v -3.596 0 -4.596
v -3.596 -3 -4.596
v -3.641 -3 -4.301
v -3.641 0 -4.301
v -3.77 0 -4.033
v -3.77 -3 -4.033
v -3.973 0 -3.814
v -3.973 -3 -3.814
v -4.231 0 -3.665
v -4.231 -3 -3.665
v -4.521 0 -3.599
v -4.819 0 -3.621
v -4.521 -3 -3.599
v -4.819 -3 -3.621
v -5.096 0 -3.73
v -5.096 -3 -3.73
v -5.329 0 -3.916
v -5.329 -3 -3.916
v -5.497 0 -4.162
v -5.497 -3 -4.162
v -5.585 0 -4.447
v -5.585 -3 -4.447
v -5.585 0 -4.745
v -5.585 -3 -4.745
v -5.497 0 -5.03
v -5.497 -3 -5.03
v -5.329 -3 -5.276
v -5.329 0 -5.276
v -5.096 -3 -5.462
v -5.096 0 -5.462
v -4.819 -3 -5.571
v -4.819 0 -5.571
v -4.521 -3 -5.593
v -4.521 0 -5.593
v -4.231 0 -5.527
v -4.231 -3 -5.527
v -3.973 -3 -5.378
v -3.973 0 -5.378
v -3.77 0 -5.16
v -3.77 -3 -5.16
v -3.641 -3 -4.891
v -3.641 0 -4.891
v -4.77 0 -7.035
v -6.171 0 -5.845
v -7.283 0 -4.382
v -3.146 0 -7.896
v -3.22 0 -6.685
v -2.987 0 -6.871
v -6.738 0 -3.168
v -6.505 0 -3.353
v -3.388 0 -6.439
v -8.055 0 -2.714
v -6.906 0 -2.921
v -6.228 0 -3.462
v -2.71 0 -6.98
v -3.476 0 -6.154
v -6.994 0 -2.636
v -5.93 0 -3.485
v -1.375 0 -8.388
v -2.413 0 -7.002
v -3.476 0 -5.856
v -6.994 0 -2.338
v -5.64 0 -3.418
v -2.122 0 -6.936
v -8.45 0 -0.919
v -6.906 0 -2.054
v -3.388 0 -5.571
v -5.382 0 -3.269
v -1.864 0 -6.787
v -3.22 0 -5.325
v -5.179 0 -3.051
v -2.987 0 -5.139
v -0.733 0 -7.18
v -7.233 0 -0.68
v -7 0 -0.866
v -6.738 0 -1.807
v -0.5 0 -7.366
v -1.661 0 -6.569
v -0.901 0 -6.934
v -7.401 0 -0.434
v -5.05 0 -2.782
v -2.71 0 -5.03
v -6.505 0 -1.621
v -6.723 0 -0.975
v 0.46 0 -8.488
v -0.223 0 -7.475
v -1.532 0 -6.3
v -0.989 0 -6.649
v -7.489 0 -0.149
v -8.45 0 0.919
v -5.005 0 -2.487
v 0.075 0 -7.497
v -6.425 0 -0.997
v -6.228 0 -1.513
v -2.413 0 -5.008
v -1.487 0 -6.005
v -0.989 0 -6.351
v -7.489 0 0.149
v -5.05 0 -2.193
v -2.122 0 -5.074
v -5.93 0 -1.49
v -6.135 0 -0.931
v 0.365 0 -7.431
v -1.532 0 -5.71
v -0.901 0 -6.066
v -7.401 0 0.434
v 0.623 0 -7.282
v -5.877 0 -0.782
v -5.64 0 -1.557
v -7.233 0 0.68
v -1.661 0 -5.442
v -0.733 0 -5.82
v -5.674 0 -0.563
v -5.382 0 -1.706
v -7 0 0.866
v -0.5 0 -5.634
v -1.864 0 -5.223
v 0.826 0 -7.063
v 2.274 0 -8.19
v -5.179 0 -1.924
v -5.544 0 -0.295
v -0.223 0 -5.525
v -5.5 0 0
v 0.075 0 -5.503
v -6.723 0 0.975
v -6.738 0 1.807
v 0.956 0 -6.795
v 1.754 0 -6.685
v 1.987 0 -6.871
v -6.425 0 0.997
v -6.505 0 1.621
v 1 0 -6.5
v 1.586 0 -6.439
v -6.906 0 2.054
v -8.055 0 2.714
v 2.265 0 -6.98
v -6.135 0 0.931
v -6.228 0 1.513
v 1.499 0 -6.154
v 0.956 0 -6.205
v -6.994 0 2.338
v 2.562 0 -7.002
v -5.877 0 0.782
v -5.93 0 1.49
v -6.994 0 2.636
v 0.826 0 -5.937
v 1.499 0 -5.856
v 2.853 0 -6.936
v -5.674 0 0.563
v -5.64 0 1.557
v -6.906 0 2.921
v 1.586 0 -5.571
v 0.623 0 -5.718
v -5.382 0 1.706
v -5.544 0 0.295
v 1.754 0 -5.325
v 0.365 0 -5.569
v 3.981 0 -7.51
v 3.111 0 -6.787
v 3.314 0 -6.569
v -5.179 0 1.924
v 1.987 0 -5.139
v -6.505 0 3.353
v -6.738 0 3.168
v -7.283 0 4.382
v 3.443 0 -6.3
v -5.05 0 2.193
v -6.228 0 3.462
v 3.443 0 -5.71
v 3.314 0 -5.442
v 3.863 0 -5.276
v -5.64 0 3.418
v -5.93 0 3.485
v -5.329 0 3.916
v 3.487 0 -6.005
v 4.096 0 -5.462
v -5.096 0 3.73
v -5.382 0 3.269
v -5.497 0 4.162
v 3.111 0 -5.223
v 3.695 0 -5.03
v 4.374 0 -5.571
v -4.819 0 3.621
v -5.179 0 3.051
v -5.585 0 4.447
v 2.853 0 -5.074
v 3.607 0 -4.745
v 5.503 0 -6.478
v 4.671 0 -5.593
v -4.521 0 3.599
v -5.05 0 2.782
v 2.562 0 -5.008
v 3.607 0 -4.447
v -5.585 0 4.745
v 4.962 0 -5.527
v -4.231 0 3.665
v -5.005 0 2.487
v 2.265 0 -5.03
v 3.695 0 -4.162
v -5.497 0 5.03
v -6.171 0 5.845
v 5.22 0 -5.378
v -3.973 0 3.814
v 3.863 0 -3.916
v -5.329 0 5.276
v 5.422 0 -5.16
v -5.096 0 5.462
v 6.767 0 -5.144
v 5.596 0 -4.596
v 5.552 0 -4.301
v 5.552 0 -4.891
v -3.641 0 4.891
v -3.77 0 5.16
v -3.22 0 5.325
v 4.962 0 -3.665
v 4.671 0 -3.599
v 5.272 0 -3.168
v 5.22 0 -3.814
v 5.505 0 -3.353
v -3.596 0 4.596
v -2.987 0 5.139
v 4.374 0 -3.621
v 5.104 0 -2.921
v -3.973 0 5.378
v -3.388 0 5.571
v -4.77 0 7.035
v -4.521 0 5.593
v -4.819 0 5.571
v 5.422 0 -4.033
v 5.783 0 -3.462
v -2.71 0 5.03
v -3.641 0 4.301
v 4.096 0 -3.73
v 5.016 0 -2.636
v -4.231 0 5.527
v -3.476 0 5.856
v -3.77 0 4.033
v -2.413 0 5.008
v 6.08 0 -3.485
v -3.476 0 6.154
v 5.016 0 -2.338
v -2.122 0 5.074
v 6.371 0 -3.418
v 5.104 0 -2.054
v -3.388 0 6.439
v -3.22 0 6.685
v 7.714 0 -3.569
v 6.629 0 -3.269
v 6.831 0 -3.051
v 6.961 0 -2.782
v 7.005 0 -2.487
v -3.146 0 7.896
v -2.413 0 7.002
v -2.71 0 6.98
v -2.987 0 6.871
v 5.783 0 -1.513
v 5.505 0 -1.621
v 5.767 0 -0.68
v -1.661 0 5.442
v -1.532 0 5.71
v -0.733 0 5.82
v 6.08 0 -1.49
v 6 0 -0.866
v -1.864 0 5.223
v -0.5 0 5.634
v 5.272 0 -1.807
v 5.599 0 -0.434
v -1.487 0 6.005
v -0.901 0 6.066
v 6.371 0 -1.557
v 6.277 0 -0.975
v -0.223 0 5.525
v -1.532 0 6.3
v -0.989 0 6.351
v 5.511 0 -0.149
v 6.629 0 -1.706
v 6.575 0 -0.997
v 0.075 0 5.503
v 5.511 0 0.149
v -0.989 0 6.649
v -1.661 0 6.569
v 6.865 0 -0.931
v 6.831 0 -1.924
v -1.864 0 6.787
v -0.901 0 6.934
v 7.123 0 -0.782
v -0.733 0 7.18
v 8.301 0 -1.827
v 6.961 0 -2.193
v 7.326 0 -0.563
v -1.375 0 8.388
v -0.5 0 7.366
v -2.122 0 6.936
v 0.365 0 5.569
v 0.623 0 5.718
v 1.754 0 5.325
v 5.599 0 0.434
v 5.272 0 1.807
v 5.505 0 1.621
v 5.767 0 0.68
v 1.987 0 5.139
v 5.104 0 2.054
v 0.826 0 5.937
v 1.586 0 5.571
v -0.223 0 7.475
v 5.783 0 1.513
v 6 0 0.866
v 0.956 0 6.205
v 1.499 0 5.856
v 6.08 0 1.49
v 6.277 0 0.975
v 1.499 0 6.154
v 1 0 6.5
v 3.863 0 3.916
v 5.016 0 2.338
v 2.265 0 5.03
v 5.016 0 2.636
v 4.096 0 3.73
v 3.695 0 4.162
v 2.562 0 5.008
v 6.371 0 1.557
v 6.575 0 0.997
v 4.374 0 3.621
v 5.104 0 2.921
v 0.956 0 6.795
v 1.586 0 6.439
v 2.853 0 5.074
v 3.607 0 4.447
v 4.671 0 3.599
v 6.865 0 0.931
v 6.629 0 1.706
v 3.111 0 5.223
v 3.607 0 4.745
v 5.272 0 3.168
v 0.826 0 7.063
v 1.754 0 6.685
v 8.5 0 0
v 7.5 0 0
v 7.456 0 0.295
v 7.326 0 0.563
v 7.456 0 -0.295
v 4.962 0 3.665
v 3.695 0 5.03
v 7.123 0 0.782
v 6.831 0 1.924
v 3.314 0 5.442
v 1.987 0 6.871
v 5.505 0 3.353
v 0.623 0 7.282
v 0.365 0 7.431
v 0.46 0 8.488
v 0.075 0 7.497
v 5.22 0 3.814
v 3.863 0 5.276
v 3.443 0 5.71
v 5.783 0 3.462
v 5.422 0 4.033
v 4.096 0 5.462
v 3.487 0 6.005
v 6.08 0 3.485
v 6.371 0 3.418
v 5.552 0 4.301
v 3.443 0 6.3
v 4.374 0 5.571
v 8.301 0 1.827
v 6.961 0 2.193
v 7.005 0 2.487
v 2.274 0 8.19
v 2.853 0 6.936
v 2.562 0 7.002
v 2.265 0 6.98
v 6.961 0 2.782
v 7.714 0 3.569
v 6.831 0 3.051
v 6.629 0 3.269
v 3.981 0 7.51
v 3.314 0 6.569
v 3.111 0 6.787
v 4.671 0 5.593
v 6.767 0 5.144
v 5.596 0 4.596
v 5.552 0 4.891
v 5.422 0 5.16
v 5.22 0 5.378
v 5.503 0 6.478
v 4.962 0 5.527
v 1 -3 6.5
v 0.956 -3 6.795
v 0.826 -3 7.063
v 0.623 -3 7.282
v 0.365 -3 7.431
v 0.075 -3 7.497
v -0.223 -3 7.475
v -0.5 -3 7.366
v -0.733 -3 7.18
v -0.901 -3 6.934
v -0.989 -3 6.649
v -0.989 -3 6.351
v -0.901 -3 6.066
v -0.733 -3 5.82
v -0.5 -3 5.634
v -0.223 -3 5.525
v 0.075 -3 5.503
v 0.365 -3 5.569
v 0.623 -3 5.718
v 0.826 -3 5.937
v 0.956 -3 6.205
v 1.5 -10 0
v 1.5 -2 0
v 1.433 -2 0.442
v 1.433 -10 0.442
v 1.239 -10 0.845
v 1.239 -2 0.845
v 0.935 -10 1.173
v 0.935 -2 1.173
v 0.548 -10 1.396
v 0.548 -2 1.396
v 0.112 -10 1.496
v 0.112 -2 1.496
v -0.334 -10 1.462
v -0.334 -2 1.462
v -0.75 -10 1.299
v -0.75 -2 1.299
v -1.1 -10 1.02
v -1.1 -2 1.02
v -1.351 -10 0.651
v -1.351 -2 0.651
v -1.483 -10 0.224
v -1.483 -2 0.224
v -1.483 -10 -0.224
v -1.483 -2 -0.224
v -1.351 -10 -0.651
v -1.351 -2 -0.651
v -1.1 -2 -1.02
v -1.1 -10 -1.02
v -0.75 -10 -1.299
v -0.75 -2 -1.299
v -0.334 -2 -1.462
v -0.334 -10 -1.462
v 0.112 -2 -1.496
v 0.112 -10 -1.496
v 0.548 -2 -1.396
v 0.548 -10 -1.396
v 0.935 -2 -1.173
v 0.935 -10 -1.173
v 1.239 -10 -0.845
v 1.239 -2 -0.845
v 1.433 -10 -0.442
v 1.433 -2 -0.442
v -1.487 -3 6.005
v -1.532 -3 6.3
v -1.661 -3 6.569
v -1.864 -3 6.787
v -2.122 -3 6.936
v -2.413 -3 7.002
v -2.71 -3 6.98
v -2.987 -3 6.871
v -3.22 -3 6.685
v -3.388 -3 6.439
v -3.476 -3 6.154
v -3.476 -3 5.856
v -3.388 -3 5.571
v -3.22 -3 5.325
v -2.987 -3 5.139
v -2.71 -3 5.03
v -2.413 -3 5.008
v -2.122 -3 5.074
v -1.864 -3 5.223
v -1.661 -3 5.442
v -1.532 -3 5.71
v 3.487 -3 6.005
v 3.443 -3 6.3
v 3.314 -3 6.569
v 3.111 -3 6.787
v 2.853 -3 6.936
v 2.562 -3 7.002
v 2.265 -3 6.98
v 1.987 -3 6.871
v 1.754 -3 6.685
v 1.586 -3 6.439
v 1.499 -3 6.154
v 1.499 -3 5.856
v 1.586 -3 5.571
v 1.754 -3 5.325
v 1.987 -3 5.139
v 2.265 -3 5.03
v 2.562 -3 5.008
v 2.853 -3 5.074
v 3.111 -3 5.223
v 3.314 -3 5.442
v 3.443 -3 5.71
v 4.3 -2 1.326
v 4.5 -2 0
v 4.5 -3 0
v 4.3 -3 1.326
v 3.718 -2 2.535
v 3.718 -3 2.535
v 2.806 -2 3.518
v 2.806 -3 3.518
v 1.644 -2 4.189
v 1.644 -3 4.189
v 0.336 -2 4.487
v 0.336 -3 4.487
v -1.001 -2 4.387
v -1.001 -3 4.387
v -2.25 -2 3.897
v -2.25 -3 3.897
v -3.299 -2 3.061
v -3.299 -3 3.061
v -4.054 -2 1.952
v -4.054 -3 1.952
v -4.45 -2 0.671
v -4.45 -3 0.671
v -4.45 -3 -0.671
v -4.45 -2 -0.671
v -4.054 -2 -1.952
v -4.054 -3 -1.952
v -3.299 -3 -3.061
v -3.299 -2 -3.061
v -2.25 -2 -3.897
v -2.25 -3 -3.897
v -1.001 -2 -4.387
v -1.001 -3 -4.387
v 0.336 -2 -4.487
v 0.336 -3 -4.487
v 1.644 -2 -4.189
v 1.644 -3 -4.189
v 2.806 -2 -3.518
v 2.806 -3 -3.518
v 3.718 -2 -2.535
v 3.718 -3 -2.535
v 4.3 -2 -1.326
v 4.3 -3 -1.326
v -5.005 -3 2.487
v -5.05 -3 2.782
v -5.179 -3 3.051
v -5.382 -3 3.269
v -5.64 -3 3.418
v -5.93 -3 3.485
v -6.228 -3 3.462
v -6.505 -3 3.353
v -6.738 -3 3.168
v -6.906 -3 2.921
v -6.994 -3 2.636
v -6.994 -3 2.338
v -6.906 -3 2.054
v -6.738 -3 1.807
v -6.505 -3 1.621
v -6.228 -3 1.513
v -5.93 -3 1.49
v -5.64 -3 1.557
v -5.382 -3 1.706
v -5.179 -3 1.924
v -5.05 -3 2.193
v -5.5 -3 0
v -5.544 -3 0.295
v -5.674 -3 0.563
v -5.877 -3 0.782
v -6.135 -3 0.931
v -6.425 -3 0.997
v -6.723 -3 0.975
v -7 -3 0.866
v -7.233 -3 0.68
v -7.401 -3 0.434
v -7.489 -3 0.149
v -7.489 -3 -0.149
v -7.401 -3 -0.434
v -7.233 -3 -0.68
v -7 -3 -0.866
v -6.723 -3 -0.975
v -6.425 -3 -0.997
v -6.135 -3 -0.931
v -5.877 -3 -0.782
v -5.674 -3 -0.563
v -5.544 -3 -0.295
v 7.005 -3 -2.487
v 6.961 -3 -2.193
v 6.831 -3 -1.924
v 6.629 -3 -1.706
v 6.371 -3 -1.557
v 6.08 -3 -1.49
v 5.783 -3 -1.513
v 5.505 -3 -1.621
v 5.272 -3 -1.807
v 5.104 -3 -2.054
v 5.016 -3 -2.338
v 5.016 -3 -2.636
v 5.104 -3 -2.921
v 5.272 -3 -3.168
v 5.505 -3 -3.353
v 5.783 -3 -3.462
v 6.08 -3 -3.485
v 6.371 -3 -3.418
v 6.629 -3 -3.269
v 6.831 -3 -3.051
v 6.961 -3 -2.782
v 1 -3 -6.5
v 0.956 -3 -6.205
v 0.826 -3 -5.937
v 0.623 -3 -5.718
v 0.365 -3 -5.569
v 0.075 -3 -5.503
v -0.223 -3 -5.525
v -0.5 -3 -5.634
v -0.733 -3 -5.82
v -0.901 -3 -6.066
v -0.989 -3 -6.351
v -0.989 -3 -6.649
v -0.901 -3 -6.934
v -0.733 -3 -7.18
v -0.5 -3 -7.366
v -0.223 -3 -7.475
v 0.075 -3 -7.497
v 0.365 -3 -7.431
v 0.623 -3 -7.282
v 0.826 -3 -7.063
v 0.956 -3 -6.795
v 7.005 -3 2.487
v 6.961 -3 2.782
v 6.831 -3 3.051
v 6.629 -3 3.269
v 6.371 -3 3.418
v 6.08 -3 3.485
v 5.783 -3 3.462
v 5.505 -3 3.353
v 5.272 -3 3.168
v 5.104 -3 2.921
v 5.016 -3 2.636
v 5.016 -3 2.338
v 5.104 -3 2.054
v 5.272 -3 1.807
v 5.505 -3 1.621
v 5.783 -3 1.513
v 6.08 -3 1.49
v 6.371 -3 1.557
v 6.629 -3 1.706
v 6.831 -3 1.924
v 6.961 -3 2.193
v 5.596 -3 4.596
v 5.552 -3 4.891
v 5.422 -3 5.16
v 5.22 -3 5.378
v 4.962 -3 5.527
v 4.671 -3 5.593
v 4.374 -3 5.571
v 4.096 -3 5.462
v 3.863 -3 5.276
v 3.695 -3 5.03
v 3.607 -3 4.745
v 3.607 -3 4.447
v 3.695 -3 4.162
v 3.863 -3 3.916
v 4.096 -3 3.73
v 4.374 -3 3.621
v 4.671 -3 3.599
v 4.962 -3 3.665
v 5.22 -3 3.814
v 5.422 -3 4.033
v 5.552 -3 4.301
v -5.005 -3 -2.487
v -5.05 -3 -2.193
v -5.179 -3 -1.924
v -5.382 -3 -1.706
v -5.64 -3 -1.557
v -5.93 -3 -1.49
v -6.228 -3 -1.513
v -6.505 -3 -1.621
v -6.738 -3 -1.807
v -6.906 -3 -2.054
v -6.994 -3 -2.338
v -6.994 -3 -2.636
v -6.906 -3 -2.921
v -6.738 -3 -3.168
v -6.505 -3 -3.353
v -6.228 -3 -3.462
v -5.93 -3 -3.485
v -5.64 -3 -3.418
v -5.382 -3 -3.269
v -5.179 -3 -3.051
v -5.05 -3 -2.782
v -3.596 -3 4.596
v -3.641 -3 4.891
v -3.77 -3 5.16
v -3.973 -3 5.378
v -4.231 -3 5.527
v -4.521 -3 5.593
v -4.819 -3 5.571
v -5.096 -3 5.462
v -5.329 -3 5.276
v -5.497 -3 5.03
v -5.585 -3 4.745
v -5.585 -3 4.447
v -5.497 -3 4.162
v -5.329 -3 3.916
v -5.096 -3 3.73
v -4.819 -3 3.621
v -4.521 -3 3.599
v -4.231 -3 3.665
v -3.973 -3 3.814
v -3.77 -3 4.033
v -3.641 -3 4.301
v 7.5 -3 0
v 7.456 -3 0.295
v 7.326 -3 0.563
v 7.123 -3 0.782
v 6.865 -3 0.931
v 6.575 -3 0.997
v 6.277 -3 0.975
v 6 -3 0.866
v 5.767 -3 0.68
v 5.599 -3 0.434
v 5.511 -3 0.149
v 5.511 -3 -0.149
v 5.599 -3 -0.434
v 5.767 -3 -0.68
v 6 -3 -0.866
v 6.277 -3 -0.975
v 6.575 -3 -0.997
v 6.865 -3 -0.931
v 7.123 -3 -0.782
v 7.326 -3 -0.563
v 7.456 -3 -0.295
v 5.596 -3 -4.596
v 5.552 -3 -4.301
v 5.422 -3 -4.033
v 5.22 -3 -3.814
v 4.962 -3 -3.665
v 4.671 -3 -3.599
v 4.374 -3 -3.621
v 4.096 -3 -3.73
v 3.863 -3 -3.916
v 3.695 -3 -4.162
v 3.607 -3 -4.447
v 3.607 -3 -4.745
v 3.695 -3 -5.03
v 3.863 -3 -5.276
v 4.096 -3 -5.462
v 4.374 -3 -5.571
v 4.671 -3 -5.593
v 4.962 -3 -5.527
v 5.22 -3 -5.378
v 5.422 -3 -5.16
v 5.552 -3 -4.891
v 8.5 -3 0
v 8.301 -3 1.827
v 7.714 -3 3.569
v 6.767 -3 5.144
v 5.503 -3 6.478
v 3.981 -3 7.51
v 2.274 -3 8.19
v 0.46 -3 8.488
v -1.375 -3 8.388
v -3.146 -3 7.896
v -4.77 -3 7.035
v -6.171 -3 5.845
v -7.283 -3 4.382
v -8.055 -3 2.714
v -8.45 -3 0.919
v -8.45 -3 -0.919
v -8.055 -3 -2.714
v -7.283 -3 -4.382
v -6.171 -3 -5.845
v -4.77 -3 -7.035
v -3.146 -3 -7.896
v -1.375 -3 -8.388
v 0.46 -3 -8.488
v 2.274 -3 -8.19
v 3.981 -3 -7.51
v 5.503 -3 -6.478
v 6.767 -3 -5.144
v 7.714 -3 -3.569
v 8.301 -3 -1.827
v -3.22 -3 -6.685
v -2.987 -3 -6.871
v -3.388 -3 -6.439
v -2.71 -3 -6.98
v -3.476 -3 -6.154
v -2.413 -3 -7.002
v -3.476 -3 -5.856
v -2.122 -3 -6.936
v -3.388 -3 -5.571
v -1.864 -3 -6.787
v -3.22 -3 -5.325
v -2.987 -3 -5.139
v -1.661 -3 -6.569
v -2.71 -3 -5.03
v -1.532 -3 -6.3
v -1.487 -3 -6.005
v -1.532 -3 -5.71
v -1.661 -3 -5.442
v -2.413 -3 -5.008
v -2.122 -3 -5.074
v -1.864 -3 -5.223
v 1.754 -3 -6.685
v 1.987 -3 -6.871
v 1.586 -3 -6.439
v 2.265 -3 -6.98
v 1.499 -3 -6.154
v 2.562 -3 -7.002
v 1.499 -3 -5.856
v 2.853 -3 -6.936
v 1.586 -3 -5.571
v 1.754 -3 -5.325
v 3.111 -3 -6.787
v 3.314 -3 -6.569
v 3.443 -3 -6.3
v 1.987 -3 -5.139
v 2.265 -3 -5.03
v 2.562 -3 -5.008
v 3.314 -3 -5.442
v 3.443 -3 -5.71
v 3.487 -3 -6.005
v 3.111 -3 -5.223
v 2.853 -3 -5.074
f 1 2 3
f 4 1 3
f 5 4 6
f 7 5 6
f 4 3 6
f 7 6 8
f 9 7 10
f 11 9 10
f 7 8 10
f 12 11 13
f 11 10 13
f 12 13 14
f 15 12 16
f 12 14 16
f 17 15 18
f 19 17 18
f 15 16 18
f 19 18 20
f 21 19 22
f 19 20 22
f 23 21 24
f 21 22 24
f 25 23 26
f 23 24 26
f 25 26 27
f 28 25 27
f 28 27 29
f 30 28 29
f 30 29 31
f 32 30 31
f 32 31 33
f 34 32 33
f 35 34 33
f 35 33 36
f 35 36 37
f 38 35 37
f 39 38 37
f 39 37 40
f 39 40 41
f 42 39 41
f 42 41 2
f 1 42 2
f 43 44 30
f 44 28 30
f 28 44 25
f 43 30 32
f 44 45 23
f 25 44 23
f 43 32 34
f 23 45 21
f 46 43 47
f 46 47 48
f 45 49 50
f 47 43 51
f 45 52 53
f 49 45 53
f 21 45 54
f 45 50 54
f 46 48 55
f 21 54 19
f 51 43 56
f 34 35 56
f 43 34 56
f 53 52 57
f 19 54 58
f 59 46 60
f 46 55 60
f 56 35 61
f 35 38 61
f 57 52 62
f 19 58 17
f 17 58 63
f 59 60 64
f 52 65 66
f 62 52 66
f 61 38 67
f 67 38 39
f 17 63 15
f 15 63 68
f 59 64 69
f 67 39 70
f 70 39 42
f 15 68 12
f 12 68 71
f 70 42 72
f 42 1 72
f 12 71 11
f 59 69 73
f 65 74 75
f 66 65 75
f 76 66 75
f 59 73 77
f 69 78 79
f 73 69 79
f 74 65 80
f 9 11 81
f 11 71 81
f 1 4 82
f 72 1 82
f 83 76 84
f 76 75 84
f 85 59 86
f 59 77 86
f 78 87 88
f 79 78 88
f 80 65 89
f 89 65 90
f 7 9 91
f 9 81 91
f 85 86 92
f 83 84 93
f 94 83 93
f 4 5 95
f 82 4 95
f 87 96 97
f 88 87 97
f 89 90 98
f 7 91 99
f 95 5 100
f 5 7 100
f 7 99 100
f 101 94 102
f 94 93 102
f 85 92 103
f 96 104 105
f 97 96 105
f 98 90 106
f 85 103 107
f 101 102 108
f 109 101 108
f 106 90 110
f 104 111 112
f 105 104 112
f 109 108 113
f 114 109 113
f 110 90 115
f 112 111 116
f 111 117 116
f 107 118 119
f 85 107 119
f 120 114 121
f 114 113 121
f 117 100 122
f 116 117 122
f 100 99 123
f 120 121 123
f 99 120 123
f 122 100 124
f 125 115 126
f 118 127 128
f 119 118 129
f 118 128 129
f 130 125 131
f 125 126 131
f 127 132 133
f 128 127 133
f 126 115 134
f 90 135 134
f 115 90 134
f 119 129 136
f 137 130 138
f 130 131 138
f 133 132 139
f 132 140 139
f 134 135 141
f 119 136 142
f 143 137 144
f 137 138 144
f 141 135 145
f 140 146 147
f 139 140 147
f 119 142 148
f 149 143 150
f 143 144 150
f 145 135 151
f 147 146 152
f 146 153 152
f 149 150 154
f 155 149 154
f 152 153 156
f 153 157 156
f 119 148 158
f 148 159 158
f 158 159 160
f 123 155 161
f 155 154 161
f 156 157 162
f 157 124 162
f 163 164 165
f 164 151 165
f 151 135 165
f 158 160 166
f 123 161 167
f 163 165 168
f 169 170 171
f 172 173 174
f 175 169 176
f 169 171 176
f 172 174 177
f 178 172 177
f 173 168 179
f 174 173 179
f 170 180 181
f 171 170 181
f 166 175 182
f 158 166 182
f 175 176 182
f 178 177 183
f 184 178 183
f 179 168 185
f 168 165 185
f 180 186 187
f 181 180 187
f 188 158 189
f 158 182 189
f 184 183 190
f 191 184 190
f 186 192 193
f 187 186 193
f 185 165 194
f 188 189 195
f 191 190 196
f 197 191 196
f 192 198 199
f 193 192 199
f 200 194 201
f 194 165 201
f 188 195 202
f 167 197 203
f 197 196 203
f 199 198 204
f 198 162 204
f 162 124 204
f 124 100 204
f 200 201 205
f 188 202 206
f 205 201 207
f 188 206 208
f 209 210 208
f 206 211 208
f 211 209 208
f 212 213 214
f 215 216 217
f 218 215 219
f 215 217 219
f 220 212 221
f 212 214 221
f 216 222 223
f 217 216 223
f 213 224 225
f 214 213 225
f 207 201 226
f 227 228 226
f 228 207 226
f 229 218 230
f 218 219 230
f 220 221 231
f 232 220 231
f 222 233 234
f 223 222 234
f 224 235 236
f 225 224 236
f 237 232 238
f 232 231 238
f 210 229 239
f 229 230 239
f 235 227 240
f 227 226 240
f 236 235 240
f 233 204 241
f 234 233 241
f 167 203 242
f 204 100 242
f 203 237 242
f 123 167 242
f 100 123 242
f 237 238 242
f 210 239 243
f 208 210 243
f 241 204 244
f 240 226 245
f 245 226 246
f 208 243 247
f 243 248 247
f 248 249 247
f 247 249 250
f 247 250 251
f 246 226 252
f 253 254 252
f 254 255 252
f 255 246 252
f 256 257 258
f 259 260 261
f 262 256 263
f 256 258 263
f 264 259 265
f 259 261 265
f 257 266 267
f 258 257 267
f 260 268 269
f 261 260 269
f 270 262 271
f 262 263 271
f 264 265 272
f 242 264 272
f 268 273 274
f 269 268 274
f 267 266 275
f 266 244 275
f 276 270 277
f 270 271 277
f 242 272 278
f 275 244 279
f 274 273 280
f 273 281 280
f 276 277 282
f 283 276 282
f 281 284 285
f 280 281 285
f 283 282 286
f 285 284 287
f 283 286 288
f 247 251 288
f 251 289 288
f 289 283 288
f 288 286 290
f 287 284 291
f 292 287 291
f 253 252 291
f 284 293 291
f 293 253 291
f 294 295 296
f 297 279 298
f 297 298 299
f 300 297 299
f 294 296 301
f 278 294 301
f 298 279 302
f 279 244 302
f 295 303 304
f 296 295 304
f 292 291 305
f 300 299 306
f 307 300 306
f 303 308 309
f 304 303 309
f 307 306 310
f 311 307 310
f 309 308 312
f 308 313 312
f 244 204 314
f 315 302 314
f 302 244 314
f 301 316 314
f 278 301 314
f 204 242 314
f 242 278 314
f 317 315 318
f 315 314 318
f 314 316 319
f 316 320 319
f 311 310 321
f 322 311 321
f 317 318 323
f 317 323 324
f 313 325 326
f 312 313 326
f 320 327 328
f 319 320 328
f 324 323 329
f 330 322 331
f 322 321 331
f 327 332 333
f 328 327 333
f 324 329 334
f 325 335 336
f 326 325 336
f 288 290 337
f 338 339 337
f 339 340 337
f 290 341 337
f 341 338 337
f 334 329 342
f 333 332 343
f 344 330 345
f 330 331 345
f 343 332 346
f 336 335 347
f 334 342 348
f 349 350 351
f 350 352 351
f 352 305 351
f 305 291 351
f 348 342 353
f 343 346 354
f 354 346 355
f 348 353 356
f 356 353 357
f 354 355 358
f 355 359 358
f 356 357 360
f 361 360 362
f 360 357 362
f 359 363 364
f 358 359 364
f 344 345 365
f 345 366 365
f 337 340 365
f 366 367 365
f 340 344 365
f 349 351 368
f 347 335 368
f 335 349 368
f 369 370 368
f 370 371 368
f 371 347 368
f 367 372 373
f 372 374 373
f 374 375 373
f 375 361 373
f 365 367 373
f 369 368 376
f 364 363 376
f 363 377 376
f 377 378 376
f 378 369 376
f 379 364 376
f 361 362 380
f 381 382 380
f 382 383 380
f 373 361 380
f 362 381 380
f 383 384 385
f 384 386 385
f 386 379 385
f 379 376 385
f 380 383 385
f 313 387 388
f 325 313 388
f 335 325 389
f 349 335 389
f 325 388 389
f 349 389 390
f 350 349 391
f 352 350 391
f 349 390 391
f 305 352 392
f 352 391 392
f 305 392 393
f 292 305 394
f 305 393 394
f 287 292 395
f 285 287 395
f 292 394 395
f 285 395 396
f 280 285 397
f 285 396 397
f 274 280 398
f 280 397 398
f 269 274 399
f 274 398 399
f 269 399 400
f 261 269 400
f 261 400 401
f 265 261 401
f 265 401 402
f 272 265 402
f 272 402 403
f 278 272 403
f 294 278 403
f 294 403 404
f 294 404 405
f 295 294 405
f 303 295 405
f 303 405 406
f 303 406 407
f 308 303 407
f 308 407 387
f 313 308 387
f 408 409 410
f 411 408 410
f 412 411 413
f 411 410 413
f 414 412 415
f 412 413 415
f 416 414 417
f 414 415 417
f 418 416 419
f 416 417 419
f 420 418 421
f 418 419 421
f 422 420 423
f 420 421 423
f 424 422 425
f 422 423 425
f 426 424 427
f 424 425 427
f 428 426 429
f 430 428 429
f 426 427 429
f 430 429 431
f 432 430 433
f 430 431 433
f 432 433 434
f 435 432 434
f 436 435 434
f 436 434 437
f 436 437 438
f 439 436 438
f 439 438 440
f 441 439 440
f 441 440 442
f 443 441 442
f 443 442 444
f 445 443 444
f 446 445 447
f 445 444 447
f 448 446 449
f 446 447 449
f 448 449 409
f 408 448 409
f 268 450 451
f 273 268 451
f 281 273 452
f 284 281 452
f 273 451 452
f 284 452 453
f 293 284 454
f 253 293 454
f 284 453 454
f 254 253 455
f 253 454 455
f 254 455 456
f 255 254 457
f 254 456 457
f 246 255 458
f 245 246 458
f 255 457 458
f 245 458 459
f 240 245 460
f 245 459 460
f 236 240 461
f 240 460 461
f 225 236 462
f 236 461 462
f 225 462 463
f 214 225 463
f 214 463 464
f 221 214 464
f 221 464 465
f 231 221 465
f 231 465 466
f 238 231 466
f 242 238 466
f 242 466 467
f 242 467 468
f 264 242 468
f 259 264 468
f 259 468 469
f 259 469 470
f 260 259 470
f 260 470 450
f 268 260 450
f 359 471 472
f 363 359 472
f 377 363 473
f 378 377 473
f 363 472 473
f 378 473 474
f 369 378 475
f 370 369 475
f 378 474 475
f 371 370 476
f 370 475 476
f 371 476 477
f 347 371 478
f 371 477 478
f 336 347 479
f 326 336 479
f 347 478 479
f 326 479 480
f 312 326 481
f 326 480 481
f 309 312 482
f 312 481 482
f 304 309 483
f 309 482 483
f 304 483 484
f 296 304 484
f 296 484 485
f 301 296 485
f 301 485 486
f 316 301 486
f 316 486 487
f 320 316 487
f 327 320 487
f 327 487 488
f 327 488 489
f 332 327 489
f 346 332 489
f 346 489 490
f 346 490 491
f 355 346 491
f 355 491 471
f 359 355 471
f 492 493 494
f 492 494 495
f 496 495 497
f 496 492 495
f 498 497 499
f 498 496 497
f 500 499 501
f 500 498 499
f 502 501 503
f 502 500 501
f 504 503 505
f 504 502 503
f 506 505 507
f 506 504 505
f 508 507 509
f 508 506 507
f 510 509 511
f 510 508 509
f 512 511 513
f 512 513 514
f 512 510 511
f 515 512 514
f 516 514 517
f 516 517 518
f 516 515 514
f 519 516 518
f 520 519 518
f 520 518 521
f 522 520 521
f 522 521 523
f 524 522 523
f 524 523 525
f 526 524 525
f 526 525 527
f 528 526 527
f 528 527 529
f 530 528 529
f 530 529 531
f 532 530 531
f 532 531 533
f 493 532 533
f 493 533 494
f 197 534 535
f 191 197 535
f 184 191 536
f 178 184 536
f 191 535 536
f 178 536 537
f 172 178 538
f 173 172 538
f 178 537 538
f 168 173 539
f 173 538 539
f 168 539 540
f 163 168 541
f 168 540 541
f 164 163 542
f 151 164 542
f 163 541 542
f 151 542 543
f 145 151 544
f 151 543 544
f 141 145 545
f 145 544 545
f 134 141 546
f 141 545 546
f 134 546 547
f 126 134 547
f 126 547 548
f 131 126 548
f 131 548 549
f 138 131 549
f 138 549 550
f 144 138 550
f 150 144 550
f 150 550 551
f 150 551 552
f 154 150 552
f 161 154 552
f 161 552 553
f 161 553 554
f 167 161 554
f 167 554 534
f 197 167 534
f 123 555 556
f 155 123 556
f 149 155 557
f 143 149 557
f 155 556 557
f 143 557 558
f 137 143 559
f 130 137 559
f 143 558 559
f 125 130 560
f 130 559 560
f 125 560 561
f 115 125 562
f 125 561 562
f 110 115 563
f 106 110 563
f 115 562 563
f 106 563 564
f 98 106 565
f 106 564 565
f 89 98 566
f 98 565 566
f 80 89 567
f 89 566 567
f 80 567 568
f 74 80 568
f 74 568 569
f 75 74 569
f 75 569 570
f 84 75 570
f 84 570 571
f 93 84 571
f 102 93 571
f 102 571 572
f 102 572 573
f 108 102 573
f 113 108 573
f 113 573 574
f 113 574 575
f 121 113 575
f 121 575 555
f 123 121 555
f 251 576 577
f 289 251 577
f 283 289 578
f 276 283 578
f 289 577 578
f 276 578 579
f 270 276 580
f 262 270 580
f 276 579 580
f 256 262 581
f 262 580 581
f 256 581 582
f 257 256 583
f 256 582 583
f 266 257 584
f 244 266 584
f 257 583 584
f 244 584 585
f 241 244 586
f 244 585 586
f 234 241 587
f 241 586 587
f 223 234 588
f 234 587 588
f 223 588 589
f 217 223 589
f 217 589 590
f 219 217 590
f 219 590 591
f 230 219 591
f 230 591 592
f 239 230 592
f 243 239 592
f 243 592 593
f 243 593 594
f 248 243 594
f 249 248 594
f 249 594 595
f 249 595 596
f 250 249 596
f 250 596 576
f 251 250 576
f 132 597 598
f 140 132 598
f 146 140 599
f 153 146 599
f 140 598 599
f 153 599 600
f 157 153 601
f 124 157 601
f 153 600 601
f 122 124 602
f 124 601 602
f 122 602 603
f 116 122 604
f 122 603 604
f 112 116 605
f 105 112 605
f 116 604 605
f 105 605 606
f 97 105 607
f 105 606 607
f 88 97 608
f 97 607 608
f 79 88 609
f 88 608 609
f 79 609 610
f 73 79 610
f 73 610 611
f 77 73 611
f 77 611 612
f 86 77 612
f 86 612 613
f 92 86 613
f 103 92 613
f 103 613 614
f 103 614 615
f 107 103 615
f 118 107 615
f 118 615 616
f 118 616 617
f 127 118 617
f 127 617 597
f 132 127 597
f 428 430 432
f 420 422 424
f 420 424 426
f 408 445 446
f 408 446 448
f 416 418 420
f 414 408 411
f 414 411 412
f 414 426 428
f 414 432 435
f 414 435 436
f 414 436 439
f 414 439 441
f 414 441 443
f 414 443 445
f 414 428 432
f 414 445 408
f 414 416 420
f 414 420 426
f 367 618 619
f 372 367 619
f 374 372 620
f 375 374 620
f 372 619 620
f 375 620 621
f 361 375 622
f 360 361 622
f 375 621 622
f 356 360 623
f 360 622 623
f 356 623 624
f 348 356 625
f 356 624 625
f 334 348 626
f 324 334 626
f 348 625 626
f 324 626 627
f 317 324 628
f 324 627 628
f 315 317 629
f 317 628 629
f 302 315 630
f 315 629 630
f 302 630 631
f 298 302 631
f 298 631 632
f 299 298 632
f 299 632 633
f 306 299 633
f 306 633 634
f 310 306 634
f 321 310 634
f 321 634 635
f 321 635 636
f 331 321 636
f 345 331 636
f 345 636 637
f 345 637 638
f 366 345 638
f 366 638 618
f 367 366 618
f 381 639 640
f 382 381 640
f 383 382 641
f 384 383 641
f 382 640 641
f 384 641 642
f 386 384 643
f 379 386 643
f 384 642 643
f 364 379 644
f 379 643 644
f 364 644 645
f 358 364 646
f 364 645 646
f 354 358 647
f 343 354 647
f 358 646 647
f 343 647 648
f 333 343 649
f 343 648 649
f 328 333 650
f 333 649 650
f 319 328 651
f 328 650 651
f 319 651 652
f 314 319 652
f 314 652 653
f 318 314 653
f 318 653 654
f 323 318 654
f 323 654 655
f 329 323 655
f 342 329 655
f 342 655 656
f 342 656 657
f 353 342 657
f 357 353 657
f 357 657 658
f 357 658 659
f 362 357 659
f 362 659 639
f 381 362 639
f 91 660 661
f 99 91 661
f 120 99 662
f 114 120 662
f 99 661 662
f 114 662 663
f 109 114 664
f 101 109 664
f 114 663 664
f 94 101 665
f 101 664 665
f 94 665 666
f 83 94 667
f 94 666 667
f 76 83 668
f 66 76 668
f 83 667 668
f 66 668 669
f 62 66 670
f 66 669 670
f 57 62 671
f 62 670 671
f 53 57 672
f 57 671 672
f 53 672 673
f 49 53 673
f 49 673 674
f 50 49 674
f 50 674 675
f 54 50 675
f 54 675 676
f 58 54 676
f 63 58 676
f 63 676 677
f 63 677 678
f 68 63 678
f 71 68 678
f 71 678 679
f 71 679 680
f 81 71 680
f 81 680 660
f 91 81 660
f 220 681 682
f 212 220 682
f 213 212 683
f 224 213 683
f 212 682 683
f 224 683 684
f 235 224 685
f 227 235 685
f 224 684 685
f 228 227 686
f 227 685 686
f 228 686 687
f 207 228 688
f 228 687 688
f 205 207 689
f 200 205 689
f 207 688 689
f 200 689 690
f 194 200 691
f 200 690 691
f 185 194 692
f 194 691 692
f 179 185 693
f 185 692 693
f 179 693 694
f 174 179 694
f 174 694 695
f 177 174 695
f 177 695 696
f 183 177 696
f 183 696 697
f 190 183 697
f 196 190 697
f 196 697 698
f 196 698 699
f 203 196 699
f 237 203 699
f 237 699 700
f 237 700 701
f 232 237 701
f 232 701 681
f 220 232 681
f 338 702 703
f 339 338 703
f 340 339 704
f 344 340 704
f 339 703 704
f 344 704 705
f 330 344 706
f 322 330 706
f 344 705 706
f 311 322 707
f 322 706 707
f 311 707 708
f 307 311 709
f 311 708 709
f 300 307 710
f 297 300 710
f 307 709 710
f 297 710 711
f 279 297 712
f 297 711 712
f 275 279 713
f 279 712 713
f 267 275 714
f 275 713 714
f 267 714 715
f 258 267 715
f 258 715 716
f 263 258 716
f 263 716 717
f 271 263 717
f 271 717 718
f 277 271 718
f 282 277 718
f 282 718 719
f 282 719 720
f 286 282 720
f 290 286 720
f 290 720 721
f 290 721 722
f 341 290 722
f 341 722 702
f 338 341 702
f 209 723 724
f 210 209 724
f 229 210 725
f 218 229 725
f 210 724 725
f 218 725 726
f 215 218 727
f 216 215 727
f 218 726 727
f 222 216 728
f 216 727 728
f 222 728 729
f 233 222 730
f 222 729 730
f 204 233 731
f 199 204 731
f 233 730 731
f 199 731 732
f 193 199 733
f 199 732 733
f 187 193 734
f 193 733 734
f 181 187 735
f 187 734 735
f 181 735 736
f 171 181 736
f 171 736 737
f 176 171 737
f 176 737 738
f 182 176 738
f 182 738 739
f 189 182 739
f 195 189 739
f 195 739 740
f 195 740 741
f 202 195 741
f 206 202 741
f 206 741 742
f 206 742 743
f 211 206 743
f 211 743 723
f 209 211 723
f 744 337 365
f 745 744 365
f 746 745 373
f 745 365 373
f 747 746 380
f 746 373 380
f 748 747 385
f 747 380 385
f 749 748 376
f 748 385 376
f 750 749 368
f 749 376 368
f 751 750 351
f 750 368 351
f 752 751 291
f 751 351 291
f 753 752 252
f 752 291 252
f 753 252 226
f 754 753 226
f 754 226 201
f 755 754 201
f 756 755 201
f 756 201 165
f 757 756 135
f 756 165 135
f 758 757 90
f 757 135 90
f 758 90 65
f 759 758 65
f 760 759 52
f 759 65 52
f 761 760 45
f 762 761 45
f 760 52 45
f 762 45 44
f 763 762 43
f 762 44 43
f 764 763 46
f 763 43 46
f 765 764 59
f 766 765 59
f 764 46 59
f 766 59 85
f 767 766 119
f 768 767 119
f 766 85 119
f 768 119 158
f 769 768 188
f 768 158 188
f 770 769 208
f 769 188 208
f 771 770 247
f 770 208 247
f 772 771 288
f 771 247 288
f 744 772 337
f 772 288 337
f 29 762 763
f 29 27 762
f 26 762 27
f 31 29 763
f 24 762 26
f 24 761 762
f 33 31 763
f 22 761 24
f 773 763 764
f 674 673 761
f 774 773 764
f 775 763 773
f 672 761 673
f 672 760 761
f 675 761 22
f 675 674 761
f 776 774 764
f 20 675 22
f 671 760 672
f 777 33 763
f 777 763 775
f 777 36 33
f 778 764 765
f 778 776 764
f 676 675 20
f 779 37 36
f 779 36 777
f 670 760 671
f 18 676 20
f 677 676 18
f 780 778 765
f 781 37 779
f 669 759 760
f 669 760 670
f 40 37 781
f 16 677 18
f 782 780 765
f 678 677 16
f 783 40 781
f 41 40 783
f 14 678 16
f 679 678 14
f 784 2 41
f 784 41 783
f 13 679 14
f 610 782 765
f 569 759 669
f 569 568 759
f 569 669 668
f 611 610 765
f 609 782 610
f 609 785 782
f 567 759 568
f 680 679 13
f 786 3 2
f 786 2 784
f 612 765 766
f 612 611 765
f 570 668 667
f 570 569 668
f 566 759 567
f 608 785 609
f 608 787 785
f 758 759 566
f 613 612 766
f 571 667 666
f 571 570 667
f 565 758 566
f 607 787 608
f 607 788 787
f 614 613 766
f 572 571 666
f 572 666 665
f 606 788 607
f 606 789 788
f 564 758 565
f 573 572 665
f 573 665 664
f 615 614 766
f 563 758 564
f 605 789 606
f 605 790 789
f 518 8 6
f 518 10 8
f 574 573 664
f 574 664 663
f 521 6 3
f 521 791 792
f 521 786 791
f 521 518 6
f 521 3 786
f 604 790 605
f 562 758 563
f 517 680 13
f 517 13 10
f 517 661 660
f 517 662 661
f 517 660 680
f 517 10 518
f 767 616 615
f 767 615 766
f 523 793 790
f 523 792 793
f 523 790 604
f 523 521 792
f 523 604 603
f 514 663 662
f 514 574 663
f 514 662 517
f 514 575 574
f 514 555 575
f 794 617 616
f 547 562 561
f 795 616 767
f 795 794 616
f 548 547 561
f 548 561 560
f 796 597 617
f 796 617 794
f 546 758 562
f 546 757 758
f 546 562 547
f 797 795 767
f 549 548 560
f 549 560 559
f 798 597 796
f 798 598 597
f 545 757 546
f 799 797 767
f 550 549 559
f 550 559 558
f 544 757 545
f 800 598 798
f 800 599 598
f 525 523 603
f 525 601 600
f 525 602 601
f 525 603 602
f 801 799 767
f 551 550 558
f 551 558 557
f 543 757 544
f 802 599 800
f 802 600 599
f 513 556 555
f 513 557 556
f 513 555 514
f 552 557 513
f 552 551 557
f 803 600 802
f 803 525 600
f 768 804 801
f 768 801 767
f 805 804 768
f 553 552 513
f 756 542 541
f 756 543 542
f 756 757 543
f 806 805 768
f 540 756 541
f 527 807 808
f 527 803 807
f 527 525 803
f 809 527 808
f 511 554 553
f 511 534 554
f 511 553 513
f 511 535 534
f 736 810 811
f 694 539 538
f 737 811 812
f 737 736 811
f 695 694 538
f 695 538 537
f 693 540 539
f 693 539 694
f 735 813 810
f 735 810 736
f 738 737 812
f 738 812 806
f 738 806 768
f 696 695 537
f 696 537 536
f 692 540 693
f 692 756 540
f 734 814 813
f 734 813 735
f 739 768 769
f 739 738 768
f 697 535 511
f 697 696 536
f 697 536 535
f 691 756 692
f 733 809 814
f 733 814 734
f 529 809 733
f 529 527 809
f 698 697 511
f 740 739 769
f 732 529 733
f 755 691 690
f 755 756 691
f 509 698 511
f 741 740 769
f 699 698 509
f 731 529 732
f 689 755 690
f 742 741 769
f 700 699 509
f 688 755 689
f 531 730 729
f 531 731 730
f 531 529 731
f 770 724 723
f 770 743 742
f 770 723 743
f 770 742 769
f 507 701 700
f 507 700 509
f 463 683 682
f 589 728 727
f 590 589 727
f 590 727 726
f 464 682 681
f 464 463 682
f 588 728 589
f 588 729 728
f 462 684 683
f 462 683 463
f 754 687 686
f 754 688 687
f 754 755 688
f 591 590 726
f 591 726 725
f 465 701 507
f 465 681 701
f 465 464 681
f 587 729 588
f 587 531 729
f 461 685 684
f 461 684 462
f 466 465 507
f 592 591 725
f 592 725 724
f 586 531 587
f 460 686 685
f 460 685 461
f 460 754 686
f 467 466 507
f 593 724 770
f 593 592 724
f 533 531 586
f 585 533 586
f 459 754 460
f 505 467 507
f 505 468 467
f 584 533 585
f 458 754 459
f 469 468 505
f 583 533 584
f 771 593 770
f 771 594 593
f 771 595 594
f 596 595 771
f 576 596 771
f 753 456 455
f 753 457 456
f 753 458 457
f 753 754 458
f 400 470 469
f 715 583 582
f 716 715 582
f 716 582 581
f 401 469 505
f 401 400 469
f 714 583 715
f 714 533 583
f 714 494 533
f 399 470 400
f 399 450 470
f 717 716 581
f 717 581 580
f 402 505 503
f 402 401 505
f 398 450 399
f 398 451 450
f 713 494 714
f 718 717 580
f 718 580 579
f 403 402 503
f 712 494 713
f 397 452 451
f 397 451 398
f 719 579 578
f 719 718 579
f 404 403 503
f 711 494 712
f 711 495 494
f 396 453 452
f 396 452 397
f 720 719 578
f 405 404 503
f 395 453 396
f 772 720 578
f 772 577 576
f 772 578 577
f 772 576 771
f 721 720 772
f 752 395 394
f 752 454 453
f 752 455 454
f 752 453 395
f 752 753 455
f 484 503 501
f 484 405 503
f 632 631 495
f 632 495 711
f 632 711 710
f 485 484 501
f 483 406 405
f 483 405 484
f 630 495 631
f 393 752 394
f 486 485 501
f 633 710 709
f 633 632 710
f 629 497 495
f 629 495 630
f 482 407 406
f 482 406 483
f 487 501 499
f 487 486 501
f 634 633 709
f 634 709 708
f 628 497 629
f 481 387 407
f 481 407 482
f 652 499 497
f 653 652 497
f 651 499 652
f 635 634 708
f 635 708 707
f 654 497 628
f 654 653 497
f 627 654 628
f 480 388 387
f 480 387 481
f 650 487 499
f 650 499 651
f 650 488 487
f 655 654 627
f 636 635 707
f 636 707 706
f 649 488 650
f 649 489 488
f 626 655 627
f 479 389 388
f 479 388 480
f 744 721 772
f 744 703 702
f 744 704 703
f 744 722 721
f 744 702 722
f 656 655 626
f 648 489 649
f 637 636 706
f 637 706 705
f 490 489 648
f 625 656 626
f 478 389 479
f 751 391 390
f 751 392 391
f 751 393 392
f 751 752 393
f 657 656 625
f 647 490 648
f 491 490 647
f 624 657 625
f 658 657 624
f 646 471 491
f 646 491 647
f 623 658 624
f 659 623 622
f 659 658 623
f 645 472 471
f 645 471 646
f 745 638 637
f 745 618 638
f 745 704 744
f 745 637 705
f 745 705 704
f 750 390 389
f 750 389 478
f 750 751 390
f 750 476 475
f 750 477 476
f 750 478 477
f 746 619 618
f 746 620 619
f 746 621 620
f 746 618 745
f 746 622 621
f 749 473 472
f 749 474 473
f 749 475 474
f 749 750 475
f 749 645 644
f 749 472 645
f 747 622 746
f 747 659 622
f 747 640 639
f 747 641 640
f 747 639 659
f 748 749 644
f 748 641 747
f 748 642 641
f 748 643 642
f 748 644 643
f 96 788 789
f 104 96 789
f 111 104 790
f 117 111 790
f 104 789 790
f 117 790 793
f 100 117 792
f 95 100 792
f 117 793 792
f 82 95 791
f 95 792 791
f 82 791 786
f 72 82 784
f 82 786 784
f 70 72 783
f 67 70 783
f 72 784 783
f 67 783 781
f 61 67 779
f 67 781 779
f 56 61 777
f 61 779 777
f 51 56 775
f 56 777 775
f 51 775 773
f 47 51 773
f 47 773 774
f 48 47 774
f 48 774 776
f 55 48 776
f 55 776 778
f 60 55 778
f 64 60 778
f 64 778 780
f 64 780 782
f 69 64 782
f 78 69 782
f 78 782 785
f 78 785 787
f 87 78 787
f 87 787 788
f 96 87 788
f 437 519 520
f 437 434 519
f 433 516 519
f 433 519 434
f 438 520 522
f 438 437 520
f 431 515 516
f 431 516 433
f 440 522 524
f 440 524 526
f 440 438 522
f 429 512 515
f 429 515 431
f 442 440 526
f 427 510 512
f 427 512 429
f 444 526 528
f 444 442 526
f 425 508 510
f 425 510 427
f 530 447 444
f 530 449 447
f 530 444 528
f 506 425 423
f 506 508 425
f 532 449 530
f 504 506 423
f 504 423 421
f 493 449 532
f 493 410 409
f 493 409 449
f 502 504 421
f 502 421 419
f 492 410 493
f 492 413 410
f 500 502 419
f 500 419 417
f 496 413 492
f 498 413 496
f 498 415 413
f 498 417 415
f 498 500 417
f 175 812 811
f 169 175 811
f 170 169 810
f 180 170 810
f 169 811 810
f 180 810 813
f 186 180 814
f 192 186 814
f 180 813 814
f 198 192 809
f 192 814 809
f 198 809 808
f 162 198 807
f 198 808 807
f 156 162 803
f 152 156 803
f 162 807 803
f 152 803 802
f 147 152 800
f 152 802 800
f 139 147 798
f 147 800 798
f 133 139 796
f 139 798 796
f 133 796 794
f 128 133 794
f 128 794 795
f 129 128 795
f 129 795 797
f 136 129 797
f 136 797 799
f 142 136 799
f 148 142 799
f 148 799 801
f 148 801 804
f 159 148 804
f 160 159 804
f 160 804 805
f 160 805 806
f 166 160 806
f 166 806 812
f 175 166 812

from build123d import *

# Parameters (mm, degrees)
F0_R     = 8.5
F0_R_2   = 4.5
F1_DEPTH = 3
F2_R     = 1
F3_DEPTH = 5
F4_R     = 4.5
F5_DEPTH = 2
F6_R     = 1.5
F7_DEPTH = 8


with BuildPart() as f1:
    # F0 (on Front) → F1 (new body)
    with BuildSketch(Plane.XZ):
        Circle(F0_R)
        Circle(F0_R_2, mode=Mode.SUBTRACT)
    extrude(amount=F1_DEPTH)

    # F2 (on face) → F3 (cut)
    with BuildSketch(Plane.XZ.offset(3)):
        with Locations((0, 6.5)):
            Circle(F2_R)
        with Locations((2.487442, 6.005217)):
            Circle(F2_R)
        with Locations((4.596194, 4.596194)):
            Circle(F2_R)
        with Locations((6.005217, 2.487442)):
            Circle(F2_R)
        with Locations((6.5, 0)):
            Circle(F2_R)
        with Locations((6.005217, -2.487442)):
            Circle(F2_R)
        with Locations((4.596194, -4.596194)):
            Circle(F2_R)
        with Locations((2.487442, -6.005217)):
            Circle(F2_R)
        with Locations((0, -6.5)):
            Circle(F2_R)
        with Locations((-2.487442, -6.005217)):
            Circle(F2_R)
        with Locations((-4.596194, -4.596194)):
            Circle(F2_R)
        with Locations((-6.005217, -2.487442)):
            Circle(F2_R)
        with Locations((-6.5, 0)):
            Circle(F2_R)
        with Locations((-6.005217, 2.487442)):
            Circle(F2_R)
        with Locations((-4.596194, 4.596194)):
            Circle(F2_R)
        with Locations((-2.487442, 6.005217)):
            Circle(F2_R)
    extrude(amount=-F3_DEPTH, mode=Mode.SUBTRACT)

    # F4 (on Front) → F5 (join)
    with BuildSketch(Plane.XZ):
        Circle(F4_R)
    extrude(amount=F5_DEPTH)

    # F6 (on face) → F7 (join)
    with BuildSketch(Plane.XZ.offset(2)):
        Circle(F6_R)
    extrude(amount=F7_DEPTH)


solid = f1.part
